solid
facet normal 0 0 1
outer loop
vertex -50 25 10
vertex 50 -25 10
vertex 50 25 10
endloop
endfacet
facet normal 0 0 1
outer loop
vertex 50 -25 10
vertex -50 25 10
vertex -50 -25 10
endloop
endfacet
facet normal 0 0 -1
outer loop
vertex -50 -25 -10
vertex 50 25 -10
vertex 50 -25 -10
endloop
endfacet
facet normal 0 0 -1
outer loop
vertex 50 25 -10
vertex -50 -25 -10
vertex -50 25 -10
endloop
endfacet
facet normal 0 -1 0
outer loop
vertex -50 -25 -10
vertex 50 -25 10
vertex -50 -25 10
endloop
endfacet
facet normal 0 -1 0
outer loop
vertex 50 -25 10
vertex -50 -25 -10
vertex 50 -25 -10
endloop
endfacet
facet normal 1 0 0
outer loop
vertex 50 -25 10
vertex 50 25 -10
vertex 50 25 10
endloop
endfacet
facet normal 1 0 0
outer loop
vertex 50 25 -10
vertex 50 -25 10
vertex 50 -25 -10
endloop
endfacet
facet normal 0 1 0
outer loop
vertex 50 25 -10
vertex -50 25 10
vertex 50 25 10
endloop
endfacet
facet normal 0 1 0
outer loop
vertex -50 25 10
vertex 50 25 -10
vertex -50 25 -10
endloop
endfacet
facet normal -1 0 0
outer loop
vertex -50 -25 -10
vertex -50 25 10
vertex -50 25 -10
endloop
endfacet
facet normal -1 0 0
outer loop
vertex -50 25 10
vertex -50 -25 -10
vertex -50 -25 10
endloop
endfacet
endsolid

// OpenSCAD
// Generated by SolidPython 1.1.3 on 2025-05-14 21:59:40


cube(center = true, size = [100, 50, 20]);
/***********************************************
*********      SolidPython code:      **********
************************************************
 
from solid import *
from solid.utils import *

c = cube([100, 50, 20], center=True)

scad_render_to_file(c, "sample.scad")
 
 
************************************************/
